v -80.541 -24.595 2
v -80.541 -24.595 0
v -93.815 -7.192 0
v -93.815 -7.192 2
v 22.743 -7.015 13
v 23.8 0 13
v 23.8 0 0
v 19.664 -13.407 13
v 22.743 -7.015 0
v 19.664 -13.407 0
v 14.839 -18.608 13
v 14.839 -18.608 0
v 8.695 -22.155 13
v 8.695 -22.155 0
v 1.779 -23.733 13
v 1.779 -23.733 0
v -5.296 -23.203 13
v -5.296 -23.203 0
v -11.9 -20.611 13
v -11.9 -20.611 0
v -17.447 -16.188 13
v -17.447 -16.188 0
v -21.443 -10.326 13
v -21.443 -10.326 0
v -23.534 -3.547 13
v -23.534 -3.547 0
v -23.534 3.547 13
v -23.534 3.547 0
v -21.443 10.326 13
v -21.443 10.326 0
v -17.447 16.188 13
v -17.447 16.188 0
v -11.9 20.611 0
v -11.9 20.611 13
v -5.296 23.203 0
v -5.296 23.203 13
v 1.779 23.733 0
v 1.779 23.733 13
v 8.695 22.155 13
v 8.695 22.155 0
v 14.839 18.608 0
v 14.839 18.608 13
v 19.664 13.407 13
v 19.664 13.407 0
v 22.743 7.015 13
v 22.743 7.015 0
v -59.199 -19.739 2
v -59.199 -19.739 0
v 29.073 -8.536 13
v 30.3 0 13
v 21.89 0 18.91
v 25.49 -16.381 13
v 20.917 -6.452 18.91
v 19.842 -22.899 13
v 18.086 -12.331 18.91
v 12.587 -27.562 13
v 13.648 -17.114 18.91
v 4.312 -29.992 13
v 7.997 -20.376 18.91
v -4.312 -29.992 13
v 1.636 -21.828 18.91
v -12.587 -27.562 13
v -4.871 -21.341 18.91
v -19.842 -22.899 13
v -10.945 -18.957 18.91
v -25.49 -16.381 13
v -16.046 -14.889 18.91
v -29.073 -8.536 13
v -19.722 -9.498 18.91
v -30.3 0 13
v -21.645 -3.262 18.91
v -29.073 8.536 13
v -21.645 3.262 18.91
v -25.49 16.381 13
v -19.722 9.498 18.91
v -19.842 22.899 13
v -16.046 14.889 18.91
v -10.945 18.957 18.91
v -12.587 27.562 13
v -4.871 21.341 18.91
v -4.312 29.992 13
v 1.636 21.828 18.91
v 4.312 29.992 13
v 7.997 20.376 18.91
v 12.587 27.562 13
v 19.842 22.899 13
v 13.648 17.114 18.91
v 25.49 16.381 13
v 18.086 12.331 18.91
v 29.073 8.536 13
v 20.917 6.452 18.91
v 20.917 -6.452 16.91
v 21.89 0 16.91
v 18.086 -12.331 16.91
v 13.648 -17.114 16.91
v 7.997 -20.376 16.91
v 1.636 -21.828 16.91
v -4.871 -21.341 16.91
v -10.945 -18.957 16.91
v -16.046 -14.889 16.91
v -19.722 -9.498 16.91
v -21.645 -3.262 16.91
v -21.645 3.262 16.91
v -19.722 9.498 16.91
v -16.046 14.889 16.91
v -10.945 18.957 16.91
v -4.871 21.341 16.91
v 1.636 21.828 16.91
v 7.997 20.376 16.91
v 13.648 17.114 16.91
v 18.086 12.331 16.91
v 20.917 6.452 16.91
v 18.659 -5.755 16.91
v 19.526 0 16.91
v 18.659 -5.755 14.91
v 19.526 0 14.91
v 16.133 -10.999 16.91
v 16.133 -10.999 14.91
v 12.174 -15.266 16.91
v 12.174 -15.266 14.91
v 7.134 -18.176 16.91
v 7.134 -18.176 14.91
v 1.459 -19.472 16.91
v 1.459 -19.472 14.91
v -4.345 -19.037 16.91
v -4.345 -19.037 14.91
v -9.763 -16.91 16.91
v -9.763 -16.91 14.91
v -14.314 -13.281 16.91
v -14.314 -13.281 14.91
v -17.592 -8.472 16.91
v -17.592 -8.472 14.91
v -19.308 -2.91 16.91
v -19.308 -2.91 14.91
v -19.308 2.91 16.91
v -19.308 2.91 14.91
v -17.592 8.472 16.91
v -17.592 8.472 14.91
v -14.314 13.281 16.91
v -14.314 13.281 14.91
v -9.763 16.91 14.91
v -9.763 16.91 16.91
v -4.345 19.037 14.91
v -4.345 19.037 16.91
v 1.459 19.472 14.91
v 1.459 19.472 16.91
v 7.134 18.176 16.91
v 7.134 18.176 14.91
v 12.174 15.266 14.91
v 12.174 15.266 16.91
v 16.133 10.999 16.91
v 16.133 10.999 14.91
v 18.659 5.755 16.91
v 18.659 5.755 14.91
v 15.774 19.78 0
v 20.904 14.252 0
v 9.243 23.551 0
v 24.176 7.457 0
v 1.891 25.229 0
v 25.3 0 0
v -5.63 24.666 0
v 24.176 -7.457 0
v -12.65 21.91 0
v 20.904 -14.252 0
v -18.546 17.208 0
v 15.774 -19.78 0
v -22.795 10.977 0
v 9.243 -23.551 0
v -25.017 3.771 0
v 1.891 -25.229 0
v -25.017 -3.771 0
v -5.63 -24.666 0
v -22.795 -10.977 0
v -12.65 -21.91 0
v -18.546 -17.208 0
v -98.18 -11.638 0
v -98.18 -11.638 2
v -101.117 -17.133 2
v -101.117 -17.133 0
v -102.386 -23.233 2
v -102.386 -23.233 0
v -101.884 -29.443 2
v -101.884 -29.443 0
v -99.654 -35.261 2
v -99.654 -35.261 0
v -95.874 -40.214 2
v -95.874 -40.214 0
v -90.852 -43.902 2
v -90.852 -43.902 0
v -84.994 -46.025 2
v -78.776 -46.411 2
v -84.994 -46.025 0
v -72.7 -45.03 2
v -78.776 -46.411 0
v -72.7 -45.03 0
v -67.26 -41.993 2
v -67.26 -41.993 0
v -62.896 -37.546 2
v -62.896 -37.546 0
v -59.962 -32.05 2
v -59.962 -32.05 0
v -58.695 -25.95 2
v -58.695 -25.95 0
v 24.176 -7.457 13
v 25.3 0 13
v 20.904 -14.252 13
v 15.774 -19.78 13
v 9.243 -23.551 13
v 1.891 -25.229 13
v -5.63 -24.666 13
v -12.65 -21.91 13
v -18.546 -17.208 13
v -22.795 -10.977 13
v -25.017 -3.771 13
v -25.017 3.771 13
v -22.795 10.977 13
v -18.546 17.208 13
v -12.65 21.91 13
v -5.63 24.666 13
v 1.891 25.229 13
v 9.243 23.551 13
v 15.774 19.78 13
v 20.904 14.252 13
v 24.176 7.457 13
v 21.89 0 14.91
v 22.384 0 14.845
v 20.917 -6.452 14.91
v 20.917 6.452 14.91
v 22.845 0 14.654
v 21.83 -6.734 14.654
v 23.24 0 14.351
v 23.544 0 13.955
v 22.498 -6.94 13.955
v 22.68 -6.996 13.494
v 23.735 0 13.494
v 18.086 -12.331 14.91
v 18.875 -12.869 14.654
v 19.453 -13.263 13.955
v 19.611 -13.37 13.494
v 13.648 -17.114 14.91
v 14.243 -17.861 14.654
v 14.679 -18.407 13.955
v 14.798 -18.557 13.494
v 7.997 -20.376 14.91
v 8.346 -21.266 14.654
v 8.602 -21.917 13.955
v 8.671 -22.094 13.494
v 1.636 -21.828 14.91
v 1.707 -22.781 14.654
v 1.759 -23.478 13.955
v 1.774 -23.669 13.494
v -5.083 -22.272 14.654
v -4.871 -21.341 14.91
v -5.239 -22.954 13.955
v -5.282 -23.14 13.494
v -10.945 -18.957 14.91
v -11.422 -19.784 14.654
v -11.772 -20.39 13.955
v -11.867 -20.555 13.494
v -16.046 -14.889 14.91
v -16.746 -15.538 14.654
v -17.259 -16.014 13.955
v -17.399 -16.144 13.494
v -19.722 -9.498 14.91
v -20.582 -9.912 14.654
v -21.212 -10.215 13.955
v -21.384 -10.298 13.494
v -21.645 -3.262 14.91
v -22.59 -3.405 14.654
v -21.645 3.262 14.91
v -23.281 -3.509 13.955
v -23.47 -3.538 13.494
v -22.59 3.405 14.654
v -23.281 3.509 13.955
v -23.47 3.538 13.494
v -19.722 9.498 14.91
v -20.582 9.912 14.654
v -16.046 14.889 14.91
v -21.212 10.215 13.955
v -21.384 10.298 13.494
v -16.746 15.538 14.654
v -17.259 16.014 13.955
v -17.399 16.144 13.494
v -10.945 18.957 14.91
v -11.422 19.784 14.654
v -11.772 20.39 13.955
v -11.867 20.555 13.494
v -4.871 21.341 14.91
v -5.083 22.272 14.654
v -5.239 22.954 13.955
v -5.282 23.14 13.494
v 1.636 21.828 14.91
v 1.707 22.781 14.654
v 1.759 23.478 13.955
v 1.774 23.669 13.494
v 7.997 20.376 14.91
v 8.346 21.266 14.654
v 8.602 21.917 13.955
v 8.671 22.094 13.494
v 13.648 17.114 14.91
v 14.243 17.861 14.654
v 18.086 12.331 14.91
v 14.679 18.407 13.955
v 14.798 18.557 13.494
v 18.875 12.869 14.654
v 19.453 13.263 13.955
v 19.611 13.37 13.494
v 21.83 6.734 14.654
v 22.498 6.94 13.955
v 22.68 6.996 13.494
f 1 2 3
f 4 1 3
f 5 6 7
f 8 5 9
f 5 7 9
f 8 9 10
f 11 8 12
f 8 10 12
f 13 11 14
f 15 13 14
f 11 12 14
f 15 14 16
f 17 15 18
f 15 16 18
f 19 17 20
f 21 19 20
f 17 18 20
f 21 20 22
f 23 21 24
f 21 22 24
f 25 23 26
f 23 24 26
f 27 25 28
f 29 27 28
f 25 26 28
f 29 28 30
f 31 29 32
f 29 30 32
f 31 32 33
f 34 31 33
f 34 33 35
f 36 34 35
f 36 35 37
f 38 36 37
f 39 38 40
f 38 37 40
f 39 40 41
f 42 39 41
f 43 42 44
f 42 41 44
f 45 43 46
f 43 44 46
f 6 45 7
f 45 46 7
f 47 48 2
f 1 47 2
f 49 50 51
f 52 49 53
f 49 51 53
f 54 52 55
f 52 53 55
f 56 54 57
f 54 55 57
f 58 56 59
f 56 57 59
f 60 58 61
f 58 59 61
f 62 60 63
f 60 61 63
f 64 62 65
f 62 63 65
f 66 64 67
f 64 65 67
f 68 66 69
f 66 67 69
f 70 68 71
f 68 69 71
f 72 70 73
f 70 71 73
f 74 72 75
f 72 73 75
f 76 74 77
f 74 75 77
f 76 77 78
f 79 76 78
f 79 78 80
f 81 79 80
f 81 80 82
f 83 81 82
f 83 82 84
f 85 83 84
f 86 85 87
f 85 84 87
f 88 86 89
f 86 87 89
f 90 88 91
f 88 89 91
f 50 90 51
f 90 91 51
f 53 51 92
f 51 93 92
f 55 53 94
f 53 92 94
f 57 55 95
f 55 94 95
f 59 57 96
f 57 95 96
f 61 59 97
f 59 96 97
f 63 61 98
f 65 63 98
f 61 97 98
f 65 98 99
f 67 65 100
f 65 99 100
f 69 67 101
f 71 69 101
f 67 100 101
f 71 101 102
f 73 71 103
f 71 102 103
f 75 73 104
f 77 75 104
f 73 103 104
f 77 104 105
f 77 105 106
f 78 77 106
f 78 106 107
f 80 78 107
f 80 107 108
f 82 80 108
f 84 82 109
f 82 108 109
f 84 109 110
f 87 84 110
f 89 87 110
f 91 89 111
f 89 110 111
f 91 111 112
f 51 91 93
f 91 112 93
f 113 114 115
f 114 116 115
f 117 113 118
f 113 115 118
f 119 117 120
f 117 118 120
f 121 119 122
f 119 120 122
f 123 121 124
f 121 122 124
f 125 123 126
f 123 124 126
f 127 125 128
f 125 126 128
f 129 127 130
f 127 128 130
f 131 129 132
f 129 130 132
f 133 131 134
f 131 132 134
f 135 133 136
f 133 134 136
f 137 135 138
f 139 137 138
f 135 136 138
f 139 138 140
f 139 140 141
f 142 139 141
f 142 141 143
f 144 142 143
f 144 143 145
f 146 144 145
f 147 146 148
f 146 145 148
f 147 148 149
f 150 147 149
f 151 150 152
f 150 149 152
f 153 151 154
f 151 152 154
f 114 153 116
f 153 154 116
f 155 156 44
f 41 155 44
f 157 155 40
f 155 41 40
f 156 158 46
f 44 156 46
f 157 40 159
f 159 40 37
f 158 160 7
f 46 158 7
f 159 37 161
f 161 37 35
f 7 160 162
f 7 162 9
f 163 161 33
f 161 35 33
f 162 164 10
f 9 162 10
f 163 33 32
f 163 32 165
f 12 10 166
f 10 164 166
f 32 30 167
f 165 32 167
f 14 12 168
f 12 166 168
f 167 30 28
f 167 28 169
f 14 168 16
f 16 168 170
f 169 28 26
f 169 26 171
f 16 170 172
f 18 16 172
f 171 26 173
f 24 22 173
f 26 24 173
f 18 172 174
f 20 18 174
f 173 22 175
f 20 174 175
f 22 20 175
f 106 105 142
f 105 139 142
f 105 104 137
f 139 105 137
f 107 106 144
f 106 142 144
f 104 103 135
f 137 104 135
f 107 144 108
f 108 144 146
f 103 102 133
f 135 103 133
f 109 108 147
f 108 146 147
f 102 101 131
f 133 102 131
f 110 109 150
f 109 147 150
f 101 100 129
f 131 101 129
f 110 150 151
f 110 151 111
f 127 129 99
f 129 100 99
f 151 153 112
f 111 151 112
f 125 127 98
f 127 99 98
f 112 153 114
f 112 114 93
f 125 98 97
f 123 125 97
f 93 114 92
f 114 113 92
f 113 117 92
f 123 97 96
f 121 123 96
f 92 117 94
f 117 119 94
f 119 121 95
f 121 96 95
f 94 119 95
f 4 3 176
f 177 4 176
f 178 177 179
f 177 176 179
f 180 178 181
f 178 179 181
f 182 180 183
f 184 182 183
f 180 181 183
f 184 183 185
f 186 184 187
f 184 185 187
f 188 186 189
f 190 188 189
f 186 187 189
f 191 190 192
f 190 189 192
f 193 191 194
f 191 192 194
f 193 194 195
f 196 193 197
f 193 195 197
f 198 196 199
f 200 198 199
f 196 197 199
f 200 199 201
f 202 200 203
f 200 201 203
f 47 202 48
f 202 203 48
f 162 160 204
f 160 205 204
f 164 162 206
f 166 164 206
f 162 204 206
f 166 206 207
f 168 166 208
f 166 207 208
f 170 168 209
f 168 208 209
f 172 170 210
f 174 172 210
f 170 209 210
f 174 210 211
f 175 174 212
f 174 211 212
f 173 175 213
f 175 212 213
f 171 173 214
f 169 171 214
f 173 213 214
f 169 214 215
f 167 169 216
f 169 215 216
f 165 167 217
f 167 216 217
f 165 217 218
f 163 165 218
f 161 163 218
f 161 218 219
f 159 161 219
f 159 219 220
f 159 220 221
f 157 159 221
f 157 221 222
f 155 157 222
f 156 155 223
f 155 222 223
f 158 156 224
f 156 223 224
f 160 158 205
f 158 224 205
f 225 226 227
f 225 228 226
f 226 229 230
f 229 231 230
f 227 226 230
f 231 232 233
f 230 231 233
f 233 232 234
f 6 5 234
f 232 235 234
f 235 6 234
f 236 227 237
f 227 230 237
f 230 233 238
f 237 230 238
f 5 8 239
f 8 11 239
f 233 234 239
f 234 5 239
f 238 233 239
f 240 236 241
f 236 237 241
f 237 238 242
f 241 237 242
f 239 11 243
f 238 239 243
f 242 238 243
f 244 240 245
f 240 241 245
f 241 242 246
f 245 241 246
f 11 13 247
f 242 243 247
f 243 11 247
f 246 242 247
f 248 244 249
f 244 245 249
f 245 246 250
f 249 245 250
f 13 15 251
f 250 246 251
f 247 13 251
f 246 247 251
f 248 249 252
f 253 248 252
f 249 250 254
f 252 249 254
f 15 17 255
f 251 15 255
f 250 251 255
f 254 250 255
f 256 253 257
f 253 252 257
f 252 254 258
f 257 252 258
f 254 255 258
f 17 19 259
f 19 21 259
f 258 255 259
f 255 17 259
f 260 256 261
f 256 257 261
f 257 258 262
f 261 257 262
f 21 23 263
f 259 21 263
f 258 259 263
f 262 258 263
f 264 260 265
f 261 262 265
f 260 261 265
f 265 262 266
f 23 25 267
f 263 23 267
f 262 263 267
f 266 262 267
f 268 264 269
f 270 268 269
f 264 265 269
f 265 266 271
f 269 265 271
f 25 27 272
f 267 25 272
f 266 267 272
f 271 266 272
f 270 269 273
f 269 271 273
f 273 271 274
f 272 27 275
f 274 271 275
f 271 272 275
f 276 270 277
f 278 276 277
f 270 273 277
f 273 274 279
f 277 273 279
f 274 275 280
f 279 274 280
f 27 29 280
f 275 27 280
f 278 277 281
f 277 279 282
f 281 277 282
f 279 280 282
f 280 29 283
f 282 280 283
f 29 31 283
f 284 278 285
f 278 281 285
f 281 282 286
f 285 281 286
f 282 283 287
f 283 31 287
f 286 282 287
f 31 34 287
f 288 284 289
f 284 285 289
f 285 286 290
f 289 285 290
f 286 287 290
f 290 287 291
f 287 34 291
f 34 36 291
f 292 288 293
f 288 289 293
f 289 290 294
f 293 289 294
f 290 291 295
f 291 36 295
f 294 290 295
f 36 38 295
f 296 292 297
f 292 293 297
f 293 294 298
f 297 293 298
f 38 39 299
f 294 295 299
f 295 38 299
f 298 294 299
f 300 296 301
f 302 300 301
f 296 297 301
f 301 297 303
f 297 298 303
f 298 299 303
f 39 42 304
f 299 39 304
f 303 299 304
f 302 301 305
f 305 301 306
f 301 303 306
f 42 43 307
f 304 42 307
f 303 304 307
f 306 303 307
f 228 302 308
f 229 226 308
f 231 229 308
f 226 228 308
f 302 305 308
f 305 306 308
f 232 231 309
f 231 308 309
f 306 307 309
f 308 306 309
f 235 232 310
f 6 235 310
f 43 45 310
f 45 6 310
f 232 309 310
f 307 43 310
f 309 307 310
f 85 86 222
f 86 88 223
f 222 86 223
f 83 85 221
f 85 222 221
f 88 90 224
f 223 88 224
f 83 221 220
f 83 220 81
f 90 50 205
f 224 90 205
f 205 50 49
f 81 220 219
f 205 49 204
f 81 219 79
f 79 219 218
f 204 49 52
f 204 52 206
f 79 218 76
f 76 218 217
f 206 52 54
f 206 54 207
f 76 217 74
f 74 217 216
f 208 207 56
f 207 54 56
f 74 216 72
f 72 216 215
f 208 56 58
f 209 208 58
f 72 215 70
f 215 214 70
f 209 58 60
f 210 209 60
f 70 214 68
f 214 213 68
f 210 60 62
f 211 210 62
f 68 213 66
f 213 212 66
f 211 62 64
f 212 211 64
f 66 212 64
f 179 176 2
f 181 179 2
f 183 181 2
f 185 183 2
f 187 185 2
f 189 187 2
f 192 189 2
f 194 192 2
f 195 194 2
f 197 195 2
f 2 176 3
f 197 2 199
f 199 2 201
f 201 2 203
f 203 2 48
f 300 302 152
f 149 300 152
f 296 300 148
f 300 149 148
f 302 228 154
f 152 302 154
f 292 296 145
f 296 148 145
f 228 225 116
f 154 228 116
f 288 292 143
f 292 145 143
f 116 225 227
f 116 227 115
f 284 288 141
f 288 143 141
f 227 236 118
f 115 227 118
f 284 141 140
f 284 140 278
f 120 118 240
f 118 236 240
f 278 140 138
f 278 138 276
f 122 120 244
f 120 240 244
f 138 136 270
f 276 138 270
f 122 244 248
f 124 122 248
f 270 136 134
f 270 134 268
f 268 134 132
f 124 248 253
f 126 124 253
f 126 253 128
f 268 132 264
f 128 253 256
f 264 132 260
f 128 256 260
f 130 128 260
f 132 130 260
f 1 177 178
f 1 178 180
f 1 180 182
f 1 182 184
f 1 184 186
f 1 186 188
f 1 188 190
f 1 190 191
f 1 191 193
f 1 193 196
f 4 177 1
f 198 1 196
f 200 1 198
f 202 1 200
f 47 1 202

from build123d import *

# Parameters (mm, degrees)
F3_DEPTH = 2


with BuildPart() as f1:
    # F0 (on Front) → F1 (revolve)
    with BuildSketch(Plane.XZ):
        with BuildLine():
            Line((23.8, 13), (23.8, 0))
            Line((23.8, 0), (25.3, 0))
            Line((25.3, 0), (25.3, 13))
            Line((25.3, 13), (30.3, 13))
            Line((30.3, 13), (21.889582, 18.910418))
            Line((21.889582, 18.910418), (21.889582, 16.910418))
            Line((21.889582, 16.910418), (19.526197, 16.910418))
            Line((19.526197, 16.910418), (19.526197, 14.910418))
            Line((19.526197, 14.910418), (21.889582, 14.910418))
            ThreePointArc((21.889582, 14.910418), (23.240451, 14.35087), (23.8, 13))
        make_face()
    revolve(axis=Axis((0, 0, 4.076657), (0, 0, -1)))


with BuildPart() as f3:
    # F2 (on Top) → F3 (new body)
    with BuildSketch(Plane.XY):
        with BuildLine():
            Line((-80.540635, -24.595225), (-93.814795, -7.192371))
            ThreePointArc((-93.814795, -7.192371), (-87.999208, -45.172696), (-59.198554, -19.739479))
            Line((-59.198554, -19.739479), (-80.540635, -24.595225))
        make_face()
    extrude(amount=F3_DEPTH)


solid = Compound([f1.part, f3.part])
